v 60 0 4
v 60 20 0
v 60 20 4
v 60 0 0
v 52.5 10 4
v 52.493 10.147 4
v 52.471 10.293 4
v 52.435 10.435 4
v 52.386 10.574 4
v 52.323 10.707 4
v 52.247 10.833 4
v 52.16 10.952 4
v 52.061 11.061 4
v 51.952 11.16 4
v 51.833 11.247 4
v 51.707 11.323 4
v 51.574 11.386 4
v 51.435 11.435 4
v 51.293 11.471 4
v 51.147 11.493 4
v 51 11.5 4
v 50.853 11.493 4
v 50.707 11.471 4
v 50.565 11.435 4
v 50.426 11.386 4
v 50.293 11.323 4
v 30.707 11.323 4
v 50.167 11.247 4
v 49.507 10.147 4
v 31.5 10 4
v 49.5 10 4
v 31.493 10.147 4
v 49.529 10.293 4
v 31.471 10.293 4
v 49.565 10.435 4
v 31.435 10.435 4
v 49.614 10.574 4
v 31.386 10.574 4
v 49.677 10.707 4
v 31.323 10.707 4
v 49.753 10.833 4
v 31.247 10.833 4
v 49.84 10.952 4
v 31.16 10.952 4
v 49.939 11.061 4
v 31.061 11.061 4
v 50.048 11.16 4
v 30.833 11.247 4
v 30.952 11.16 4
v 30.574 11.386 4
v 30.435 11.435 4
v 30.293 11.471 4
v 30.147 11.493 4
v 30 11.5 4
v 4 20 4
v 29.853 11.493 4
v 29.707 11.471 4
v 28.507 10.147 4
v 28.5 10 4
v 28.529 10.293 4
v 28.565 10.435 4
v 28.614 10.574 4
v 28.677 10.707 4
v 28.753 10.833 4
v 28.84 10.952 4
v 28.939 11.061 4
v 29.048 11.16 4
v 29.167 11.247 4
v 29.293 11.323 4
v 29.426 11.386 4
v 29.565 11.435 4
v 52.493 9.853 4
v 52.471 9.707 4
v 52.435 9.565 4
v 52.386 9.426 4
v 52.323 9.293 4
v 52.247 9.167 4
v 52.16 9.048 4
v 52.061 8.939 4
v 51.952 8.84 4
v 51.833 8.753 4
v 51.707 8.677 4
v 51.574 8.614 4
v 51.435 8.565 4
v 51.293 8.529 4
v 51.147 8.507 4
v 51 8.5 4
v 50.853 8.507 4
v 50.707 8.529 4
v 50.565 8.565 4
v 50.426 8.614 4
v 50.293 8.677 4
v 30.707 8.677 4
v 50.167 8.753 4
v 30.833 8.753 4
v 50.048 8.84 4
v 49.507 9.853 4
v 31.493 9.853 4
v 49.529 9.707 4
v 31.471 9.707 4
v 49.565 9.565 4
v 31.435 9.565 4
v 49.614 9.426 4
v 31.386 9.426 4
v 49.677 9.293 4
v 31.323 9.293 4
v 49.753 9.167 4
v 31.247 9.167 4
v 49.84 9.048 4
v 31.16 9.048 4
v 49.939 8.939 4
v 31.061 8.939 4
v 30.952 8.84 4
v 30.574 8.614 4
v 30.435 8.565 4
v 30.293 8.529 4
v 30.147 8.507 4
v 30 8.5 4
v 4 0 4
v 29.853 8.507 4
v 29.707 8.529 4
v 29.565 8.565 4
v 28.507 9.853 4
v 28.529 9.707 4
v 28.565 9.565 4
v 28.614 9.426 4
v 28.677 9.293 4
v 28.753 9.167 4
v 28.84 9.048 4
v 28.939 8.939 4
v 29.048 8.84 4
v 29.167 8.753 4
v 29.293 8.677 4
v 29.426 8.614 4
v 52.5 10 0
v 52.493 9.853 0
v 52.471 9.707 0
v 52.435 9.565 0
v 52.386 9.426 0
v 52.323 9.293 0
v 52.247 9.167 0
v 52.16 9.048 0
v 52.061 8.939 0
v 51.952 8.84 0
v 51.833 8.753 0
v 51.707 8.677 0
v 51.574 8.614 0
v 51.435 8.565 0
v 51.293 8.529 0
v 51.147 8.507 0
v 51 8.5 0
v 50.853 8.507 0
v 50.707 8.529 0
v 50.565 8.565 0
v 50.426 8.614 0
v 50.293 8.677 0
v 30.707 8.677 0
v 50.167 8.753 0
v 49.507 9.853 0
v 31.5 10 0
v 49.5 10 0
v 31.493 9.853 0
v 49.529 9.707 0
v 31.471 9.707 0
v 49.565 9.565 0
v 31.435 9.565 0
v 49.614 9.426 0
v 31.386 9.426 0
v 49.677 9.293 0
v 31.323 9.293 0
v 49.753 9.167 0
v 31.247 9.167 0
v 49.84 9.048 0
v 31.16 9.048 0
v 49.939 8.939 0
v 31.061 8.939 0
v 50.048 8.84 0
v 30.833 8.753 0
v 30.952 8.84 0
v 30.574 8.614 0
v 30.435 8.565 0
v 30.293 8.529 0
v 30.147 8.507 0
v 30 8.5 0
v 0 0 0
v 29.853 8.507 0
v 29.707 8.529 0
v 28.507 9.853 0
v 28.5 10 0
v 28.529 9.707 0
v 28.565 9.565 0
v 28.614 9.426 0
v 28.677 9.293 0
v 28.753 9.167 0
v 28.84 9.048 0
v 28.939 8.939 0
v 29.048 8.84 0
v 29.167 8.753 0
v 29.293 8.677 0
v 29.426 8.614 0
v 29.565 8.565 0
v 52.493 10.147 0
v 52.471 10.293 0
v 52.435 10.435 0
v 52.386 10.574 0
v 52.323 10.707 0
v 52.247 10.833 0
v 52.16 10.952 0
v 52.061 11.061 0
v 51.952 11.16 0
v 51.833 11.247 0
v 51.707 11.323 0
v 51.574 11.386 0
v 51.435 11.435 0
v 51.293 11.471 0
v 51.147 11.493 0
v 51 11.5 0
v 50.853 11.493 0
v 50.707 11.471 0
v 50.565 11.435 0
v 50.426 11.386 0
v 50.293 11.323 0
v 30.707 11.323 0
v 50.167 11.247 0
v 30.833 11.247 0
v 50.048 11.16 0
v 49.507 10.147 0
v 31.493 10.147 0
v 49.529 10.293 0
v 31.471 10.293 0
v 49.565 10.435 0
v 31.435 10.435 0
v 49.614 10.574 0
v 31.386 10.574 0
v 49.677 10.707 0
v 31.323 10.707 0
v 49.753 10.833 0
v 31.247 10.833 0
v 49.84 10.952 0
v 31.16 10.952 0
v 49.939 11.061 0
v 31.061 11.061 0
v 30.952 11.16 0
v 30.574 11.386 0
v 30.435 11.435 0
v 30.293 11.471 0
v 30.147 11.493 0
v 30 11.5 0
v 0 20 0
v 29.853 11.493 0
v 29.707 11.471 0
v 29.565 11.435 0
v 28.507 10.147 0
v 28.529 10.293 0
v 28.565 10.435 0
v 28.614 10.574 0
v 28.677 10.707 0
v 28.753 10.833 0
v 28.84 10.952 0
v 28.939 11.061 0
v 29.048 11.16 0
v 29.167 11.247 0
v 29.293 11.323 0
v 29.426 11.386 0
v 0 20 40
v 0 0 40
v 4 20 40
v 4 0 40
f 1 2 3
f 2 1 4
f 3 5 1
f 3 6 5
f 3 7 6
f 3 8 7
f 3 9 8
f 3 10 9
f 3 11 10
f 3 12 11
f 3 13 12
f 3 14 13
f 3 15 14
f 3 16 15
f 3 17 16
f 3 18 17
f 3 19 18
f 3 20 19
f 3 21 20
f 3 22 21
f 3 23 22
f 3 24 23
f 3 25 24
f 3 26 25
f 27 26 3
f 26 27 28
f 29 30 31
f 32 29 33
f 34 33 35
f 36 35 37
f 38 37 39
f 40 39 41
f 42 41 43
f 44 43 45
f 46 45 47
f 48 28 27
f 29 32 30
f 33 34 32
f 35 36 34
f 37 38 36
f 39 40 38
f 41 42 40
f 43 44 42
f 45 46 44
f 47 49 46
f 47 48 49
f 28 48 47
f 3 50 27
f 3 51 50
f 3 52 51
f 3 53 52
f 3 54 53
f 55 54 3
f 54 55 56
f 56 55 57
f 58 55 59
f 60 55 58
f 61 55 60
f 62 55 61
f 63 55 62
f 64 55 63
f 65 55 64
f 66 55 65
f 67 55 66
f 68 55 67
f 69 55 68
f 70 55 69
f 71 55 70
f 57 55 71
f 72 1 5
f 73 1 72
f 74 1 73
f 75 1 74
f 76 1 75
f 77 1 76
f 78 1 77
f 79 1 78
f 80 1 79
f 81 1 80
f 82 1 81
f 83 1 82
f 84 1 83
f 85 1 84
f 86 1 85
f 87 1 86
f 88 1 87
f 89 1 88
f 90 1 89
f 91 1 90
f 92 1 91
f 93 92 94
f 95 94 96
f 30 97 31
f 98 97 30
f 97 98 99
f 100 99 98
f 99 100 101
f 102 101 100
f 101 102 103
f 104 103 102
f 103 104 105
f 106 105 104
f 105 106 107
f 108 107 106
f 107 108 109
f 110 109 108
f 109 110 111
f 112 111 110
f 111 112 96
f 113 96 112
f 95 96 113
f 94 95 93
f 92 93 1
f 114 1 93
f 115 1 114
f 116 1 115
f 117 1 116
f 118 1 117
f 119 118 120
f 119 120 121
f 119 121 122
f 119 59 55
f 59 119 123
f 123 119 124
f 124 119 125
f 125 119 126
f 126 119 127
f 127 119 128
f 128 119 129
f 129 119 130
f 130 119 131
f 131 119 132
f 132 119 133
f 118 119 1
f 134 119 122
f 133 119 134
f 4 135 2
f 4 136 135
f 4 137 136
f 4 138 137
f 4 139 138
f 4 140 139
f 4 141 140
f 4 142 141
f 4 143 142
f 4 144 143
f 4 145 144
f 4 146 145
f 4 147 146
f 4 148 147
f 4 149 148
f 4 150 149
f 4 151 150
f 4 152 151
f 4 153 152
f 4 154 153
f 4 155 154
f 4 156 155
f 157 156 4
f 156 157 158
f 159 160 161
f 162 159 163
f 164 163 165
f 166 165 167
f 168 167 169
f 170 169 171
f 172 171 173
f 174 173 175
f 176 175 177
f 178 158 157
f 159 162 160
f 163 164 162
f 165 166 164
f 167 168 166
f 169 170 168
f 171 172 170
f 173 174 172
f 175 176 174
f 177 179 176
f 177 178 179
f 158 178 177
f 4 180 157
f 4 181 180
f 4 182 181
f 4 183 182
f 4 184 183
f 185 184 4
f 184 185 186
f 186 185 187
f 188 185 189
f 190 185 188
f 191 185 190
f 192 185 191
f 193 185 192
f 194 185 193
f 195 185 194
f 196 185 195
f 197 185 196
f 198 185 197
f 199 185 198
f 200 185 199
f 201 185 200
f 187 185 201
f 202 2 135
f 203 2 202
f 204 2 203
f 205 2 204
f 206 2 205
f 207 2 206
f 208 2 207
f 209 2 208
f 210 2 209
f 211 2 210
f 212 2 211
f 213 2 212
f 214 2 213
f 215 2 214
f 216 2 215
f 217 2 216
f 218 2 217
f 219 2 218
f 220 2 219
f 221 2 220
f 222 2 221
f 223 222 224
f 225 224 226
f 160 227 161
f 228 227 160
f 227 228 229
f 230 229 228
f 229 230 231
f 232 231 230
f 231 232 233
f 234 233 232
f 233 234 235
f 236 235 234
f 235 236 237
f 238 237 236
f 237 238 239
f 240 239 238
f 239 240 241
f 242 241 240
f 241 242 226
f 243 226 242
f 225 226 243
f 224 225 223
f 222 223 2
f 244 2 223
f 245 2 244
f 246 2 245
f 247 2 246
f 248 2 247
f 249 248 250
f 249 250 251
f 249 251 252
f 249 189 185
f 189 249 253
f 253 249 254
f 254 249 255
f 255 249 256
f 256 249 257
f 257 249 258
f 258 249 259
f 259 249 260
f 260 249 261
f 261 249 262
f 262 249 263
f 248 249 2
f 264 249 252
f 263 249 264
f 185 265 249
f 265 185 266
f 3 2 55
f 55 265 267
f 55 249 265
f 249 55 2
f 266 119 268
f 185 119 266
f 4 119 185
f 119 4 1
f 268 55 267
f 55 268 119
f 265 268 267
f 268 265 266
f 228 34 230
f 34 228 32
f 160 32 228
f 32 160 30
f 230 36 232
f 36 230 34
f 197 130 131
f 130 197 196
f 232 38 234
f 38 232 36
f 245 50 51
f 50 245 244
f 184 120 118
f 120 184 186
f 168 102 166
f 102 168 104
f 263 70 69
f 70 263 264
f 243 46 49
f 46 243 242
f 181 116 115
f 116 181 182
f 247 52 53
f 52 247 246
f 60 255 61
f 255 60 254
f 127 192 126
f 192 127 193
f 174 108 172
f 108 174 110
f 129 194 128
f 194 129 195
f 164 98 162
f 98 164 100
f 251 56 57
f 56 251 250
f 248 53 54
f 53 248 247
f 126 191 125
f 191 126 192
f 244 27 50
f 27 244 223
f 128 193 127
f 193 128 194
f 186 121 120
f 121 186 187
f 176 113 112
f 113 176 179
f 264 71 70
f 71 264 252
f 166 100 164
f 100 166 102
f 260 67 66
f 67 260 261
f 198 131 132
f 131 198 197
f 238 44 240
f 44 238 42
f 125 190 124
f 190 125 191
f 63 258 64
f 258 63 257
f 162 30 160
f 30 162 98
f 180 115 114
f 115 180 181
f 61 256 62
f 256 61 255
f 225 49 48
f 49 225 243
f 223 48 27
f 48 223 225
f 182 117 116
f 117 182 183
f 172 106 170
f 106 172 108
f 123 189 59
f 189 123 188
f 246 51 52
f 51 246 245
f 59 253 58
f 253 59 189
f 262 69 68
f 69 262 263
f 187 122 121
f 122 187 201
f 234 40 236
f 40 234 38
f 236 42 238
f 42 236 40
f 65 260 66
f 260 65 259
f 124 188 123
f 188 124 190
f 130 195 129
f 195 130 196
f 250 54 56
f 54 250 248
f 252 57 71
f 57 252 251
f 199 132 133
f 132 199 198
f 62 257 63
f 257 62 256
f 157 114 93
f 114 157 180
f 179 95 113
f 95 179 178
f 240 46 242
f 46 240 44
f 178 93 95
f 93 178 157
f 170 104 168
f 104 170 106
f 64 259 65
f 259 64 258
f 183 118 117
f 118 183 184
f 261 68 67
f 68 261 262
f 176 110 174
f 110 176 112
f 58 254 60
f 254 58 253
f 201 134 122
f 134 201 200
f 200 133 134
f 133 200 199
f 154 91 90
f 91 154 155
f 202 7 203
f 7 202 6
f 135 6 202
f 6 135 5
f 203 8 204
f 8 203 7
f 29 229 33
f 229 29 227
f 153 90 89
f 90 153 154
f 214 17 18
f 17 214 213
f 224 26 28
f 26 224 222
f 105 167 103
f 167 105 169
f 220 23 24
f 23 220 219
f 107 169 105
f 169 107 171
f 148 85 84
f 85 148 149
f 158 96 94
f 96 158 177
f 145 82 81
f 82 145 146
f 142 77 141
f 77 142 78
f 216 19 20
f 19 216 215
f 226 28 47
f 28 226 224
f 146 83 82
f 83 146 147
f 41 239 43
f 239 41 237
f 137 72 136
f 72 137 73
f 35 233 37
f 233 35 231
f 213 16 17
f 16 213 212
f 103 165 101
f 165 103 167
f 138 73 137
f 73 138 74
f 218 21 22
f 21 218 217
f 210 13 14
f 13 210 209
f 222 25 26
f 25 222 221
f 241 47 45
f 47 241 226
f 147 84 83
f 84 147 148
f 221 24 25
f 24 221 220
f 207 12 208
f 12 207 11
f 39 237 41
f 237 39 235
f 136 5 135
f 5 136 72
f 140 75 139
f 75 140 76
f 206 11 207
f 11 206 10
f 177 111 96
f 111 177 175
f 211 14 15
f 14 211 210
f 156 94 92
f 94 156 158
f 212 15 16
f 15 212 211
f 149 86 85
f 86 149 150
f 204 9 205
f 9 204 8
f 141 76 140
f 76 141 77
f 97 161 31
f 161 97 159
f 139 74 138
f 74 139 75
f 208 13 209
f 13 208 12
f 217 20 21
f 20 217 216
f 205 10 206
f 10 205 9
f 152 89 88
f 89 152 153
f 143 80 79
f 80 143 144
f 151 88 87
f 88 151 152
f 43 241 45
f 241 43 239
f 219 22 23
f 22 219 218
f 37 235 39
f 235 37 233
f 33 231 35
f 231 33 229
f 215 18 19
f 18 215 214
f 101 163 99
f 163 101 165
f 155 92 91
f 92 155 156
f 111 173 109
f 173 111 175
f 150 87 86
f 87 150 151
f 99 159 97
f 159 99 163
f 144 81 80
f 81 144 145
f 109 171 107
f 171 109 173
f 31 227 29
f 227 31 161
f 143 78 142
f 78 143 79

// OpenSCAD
// Plantilla TISMA: soporte en L paramétrico con dos agujeros pasantes (unidades: mm).
// Cambia los parámetros de arriba; el resto se recalcula.
// Comprobación (con los valores por defecto), antes de los agujeros:
//   volumen = largo*ancho*espesor + (alto-espesor)*ancho*espesor = 60*20*4 + 36*20*4 = 7680 mm³
//   cada agujero resta pi*(d/2)^2*espesor = pi*2.25*4 ≈ 28.27 mm³  →  volumen ≈ 7623.5 mm³
//   caja: [0,0,0] → [60, 20, 40]
largo   = 60;
ancho   = 20;
alto    = 40;
espesor = 4;
d_agujero = 3;
$fn = 64;

module agujero(x) {
    translate([x, ancho / 2, -1]) cylinder(d = d_agujero, h = espesor + 2);
}

difference() {
    union() {
        cube([largo, ancho, espesor]);                       // base
        cube([espesor, ancho, alto]);                        // pared
    }
    agujero(largo * 0.5);
    agujero(largo * 0.85);
}
